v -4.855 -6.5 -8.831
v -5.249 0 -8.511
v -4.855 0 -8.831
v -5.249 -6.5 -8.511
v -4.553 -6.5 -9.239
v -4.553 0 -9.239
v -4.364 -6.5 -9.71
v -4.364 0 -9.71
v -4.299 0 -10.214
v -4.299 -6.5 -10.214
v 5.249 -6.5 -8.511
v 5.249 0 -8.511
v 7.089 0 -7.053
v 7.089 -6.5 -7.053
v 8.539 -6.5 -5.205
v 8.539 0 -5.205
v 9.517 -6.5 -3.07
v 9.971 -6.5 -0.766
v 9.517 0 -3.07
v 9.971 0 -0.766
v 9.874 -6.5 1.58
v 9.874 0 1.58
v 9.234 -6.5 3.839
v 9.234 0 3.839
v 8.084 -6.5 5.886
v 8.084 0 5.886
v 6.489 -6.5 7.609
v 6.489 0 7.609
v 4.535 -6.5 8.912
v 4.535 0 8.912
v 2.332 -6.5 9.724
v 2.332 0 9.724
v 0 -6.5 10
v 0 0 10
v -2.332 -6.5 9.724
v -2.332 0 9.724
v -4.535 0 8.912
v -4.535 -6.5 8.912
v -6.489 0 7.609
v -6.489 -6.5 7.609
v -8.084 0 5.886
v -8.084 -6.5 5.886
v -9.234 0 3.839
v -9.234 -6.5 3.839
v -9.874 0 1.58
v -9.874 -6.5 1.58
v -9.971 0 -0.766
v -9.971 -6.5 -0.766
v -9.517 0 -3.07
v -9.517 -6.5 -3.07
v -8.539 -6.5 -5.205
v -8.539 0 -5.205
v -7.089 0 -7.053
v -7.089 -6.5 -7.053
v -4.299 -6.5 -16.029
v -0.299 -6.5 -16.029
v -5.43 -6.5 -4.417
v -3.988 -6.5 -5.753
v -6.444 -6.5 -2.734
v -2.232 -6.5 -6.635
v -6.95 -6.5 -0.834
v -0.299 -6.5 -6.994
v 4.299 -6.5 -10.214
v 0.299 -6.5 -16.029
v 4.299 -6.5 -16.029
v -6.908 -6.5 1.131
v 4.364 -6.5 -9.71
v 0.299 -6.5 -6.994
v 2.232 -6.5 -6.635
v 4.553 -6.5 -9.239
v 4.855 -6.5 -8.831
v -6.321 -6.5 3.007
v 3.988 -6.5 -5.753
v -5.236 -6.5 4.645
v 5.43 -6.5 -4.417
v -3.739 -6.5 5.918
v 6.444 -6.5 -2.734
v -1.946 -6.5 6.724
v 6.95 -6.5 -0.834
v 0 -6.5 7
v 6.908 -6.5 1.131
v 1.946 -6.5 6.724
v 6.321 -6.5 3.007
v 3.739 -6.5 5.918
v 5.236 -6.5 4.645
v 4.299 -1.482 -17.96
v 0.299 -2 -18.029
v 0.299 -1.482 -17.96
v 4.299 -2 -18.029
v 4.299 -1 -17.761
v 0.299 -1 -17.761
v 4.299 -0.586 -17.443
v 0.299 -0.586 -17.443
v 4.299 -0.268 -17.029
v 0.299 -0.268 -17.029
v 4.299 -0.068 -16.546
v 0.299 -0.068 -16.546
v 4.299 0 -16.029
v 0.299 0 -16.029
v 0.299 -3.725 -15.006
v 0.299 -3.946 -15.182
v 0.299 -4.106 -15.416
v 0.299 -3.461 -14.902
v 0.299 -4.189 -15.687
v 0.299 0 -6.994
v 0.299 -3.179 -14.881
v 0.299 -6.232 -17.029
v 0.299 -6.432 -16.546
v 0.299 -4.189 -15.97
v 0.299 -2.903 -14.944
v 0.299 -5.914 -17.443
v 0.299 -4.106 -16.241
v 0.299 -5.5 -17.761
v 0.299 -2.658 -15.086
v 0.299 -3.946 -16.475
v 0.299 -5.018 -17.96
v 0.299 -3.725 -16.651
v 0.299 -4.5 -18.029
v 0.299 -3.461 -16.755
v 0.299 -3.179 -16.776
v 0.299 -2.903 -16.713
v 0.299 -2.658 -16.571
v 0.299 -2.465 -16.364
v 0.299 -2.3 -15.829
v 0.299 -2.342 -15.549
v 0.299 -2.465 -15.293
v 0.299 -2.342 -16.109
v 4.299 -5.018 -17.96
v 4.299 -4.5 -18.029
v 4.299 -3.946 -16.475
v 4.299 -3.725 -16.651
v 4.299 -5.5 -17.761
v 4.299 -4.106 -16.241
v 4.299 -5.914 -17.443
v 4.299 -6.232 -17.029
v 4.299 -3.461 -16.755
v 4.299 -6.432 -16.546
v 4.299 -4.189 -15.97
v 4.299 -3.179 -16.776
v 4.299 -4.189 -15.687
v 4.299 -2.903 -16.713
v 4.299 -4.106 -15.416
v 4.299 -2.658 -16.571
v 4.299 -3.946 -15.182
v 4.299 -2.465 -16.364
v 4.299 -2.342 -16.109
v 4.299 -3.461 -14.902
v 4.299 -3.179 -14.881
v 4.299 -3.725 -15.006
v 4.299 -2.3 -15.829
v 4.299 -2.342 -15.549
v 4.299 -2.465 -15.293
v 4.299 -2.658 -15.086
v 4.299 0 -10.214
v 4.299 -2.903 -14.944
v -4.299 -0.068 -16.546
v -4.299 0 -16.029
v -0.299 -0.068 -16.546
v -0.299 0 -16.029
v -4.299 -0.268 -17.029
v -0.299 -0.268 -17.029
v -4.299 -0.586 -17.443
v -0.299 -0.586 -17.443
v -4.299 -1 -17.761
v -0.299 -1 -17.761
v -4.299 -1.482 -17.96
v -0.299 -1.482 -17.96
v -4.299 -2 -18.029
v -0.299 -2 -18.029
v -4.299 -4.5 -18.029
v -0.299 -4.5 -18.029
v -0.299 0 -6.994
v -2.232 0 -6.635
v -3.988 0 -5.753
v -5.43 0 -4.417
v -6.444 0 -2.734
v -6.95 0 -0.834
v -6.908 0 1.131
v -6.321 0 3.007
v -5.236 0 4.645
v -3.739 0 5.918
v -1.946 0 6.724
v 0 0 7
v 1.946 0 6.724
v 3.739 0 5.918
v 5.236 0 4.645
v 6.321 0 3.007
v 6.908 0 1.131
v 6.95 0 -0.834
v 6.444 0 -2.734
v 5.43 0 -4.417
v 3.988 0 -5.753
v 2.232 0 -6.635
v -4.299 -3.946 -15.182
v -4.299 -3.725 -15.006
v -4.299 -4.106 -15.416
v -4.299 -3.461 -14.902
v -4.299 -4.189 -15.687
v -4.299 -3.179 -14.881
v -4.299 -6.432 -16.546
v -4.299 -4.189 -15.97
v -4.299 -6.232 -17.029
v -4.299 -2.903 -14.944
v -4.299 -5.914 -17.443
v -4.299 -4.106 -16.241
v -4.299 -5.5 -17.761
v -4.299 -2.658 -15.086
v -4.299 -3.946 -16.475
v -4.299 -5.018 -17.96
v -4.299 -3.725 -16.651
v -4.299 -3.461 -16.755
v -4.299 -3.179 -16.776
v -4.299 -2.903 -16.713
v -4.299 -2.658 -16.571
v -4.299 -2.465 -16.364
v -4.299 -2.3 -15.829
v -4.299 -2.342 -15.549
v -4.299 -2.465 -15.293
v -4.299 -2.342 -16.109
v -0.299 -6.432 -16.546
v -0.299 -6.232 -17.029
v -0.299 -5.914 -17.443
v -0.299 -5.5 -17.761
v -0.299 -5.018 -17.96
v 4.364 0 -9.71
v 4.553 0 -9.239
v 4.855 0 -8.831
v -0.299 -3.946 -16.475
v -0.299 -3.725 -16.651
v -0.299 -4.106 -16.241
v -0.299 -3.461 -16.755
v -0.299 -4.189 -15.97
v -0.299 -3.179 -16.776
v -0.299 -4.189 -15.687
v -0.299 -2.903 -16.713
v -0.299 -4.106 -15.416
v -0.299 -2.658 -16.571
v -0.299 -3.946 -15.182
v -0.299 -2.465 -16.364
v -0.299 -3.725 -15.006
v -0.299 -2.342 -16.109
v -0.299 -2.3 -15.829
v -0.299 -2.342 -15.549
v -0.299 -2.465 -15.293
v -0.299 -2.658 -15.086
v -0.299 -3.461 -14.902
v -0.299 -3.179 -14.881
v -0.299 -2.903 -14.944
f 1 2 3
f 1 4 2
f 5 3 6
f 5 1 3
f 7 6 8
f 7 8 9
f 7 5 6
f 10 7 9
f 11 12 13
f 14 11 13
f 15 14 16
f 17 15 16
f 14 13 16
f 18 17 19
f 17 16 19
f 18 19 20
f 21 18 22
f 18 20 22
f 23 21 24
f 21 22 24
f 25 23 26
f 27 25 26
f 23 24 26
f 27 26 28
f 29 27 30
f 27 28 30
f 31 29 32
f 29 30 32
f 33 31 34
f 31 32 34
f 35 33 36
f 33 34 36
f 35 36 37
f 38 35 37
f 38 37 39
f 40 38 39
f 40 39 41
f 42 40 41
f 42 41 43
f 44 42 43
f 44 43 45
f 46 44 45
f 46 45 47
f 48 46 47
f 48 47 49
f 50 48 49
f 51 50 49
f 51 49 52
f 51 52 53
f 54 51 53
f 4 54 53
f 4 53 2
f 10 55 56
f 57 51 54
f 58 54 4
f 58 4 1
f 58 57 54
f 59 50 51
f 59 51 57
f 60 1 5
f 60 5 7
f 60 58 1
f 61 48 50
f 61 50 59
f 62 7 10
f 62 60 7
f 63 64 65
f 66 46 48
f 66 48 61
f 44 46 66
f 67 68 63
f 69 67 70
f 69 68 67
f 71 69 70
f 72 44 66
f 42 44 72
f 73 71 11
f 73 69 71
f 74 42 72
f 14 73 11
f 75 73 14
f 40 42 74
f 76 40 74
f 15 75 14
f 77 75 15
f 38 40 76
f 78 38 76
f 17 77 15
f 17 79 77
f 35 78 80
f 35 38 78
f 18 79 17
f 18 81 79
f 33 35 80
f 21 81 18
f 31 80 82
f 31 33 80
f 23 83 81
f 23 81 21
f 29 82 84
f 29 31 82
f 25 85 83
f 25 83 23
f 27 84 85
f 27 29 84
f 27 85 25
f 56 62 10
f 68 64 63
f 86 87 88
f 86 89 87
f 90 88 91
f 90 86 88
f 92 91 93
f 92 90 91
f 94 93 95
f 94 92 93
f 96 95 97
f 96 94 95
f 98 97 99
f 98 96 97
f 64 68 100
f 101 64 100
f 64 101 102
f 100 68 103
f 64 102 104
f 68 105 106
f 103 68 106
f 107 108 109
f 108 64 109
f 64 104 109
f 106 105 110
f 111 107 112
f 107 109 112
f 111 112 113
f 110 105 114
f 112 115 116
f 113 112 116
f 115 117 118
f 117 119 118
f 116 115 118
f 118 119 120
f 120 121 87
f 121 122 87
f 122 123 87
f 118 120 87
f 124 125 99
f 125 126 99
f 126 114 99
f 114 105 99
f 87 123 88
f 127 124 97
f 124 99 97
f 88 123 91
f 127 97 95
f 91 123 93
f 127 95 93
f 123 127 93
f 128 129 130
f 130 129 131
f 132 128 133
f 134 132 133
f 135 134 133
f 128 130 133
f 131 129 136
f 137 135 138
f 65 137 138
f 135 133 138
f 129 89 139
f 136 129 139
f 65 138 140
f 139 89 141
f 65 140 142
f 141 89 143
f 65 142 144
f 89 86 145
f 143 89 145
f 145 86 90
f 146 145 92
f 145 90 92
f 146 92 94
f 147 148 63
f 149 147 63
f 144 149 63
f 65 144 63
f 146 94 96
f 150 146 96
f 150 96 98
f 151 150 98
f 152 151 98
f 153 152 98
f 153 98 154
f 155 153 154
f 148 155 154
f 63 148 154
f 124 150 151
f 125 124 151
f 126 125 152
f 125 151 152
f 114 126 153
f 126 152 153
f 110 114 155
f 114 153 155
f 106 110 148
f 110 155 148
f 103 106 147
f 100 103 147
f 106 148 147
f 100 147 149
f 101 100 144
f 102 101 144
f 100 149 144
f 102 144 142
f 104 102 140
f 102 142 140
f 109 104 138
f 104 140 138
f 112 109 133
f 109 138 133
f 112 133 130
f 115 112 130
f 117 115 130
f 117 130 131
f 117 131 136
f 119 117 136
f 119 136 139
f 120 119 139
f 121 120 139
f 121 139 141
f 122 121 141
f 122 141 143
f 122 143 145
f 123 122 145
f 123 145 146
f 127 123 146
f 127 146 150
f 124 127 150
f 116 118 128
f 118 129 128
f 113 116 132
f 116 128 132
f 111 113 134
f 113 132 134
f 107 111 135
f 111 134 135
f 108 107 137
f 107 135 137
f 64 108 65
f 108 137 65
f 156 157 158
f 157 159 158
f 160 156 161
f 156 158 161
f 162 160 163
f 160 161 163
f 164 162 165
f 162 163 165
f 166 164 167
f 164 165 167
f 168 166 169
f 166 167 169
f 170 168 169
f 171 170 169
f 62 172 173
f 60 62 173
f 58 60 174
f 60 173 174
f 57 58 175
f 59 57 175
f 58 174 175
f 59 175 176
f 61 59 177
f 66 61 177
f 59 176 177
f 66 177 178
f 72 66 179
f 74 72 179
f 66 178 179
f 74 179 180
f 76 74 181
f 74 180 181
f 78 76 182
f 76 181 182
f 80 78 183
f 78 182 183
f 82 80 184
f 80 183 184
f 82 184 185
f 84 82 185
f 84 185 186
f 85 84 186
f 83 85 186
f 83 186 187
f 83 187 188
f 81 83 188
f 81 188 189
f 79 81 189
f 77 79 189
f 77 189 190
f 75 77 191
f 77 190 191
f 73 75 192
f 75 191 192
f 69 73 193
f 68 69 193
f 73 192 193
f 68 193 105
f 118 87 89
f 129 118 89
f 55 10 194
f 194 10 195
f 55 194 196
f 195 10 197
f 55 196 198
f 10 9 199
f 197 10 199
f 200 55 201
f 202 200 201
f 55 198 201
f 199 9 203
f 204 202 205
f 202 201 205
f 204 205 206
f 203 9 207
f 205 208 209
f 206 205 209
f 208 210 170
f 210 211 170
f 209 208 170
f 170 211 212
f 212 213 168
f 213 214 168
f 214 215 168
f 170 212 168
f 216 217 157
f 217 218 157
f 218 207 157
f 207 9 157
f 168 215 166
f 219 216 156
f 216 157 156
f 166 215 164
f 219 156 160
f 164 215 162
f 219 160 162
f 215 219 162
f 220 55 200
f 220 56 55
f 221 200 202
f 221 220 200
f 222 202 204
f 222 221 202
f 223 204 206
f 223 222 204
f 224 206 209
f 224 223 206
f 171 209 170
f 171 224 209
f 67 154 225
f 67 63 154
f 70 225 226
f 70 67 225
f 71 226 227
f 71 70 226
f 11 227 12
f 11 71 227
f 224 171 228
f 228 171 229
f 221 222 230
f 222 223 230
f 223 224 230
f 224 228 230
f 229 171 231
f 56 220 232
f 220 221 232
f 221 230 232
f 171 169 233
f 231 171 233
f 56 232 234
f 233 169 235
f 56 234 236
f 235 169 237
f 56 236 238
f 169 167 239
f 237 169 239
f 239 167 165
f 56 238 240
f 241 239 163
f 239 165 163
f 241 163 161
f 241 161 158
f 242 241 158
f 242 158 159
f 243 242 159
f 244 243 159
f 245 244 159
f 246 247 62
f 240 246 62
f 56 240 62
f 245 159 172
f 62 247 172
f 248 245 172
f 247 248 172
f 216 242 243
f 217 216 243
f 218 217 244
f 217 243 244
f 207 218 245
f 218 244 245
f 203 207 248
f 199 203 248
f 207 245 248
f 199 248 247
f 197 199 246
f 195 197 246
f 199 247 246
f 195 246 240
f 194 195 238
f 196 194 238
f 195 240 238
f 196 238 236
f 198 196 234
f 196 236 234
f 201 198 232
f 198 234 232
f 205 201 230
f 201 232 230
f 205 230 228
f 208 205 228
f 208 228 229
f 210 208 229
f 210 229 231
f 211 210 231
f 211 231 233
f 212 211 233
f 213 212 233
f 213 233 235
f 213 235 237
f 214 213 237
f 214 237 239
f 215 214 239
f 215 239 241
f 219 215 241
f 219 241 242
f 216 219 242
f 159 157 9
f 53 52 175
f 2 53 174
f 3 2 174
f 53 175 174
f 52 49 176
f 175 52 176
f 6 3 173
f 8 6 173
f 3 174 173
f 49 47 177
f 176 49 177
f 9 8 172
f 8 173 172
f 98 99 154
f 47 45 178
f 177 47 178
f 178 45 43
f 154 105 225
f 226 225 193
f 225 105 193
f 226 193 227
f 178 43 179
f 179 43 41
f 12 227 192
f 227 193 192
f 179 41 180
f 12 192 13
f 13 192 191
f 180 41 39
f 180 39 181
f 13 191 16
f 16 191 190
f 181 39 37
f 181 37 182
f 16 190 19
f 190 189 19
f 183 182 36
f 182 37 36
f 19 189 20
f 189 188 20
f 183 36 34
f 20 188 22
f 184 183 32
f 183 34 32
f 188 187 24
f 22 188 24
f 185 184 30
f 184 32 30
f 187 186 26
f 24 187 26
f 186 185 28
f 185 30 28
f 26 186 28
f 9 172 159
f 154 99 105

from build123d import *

# Parameters (mm, degrees)
F1_DEPTH = 6.5
F2_R     = 0.95
F3_DEPTH = 25
F4_R     = 2
F5_R     = 2


with BuildPart() as f1:
    # F0 (on Front) → F1 (new body)
    with BuildSketch(Plane.XZ):
        with BuildLine():
            Line((4.29925, -18.028646), (4.29925, -9.028646))
            ThreePointArc((4.29925, -9.028646), (0, 10), (-4.29925, -9.028646))
            Line((-4.29925, -9.028646), (-4.29925, -18.028646))
            Line((-4.29925, -18.028646), (-0.29925, -18.028646))
            Line((-0.29925, -18.028646), (-0.29925, -6.993601))
            ThreePointArc((-0.29925, -6.993601), (0, 7), (0.29925, -6.993601))
            Line((0.29925, -6.993601), (0.29925, -18.028646))
            Line((0.29925, -18.028646), (4.29925, -18.028646))
        make_face()
    extrude(amount=F1_DEPTH)

    # F2 (on face) → F3 (cut)
    with BuildSketch(Plane.YZ.offset(4.29925)):
        with Locations((-3.25, -15.828646)):
            Circle(F2_R)
    extrude(amount=-F3_DEPTH, mode=Mode.SUBTRACT)

    # F4
    f4_edges = [f1.edges().sort_by_distance(p)[0] for p in [
        (2.29925, 0, -18.028646),
        (-2.29925, 0, -18.028646),
        (2.29925, -6.5, -18.028646),
        (-2.29925, -6.5, -18.028646),
    ]]
    fillet(f4_edges, radius=F4_R)

    # F5
    f5_edges = [f1.edges().sort_by_distance(p)[0] for p in [
        (4.29925, -3.25, -9.028646),
        (-4.29925, -3.25, -9.028646),
    ]]
    fillet(f5_edges, radius=F5_R)


solid = f1.part
